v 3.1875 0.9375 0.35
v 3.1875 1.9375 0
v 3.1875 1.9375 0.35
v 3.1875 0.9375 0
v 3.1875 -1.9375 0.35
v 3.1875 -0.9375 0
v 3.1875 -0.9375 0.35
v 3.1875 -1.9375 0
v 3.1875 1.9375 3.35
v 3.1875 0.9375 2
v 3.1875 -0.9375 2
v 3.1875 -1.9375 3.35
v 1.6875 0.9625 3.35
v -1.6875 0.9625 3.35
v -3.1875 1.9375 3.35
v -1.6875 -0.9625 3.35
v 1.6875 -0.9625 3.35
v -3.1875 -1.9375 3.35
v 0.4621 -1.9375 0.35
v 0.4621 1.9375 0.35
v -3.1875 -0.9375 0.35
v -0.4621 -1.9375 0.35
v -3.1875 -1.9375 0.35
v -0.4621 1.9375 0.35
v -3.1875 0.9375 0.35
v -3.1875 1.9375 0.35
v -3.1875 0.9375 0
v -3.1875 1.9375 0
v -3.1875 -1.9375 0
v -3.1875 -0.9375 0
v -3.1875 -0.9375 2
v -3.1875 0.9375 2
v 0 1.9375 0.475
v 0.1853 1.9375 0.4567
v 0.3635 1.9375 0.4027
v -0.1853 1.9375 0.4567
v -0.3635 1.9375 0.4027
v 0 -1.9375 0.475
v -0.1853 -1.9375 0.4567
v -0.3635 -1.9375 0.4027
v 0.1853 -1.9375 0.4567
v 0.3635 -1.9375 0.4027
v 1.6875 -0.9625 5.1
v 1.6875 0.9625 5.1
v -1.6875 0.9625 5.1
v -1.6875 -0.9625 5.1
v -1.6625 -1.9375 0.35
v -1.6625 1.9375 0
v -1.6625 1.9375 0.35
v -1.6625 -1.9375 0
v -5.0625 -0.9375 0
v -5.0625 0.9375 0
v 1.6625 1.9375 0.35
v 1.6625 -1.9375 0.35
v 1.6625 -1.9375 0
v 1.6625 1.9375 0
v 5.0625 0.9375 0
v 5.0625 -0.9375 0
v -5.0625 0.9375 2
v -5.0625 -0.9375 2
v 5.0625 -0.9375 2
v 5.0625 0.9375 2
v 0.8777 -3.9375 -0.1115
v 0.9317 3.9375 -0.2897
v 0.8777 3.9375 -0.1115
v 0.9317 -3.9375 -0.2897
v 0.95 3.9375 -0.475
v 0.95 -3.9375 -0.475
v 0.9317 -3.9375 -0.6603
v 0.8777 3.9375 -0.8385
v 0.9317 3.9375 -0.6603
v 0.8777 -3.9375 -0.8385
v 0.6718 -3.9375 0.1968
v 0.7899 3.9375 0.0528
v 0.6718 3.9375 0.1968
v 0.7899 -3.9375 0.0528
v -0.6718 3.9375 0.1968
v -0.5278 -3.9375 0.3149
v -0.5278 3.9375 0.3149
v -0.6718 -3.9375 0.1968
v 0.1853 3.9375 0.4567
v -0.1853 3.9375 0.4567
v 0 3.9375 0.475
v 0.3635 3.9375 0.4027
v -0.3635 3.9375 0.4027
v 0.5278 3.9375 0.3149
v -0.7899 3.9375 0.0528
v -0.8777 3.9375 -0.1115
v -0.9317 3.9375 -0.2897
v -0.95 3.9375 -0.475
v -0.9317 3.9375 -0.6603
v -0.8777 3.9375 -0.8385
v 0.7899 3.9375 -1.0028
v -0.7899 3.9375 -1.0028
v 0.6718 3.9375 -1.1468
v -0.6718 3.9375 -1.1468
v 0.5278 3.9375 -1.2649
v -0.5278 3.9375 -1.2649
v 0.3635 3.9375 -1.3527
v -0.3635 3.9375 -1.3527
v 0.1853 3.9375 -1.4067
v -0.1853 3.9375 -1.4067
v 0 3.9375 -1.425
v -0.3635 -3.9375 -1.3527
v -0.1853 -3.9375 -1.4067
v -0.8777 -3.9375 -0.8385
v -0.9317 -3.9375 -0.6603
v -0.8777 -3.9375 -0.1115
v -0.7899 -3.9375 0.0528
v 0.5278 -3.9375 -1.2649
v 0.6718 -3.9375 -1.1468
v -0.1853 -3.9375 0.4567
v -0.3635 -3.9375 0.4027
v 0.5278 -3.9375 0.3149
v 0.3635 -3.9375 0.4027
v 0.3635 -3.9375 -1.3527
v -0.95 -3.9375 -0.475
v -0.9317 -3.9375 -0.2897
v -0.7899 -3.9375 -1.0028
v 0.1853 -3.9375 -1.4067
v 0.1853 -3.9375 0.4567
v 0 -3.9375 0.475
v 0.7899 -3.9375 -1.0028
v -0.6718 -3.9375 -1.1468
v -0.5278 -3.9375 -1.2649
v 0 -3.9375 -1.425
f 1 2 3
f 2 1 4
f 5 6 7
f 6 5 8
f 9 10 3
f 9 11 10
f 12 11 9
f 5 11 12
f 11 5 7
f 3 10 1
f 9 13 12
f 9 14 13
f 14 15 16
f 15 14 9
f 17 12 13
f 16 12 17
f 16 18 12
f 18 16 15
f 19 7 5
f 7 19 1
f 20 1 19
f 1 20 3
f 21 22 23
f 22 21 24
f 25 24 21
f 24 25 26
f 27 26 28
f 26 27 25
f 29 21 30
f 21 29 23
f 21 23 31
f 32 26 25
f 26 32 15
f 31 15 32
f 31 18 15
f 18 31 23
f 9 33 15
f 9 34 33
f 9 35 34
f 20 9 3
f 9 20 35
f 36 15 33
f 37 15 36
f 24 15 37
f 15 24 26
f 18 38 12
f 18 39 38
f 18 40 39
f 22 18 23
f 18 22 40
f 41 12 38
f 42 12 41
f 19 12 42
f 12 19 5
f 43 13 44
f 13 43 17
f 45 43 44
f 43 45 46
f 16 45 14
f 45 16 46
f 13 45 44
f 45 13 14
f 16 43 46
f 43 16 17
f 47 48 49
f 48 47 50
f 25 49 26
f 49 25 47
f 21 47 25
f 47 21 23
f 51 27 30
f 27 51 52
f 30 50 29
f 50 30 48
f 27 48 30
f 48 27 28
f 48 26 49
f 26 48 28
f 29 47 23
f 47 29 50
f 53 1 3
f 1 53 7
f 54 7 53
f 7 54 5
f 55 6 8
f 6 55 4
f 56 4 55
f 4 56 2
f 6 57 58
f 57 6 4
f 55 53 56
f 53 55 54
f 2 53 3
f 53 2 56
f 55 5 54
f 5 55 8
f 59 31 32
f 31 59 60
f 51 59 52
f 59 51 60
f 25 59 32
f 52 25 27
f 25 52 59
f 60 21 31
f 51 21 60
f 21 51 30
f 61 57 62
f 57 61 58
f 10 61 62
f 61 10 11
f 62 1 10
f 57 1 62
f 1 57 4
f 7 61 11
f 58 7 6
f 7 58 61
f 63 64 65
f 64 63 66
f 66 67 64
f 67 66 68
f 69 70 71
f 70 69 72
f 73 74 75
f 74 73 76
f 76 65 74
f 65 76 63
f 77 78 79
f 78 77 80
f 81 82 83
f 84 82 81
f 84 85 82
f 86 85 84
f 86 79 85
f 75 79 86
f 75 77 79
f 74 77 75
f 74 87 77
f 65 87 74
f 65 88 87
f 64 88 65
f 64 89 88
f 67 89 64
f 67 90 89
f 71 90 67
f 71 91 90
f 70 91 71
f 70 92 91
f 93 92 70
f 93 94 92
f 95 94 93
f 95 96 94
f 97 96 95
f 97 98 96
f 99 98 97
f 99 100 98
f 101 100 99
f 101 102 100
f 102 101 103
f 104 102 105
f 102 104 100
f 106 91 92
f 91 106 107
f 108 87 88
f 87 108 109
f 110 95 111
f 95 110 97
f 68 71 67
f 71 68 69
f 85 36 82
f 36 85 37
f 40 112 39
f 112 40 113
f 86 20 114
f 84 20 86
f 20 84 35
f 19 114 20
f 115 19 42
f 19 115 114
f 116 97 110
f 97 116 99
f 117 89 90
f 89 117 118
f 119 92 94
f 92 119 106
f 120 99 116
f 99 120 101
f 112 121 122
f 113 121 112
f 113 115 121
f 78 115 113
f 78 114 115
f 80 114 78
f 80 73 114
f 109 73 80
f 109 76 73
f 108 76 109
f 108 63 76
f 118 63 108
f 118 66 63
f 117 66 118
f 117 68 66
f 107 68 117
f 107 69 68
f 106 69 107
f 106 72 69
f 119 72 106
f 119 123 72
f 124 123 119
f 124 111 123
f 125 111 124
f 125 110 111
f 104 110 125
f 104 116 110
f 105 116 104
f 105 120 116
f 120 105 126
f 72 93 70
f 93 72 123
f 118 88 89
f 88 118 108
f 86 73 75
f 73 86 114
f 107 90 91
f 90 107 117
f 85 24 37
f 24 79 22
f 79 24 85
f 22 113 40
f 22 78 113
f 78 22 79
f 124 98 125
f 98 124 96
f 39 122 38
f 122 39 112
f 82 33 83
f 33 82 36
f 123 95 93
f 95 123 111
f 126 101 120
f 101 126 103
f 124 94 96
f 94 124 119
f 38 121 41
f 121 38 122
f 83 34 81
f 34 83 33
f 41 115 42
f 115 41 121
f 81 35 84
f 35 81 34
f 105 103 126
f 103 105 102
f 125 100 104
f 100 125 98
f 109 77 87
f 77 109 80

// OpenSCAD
nozzle_diameter = 0.25;

tactile_button();

//charge_indicator(true);

module charge_indicator(positive = false) {
    p = positive ? (nozzle_diameter * 1.5) : 0;
    
    translate([((5.25 + p) / -2) - 0.375, ((43.5 + p) / -2) - 0.075, -2.4])
    union() {
        // PCB.
        difference() {
            union() {
                cube([5.25 + p, 43.5 + p, 3]);
                translate([-5.5 - p / 2, 1 + p / 2, 0]) 
                    cube([16.5 + p, 41.5 + p, 3]);
            }
        
            // Mounting holes
            translate([(5.25 + p) / 2, 4.125 + (p / 2), 1.5]) {
                cylinder(d = 1.75, h = 4, $fn = 32, center = true);
                translate([0, 36, 0])
                    cylinder(d = 1.75, h = 4, $fn = 32, center = true);
            }
        }
        
        // Display
        translate([-5.5 - p / 2 - 1.5, 1 + 4.7 + p / 2, 3])
            translate([]) cube([20 + p, 31.25 + p, 6 + (positive ? 8 : 0)]);
        
        if (positive) {
            // Mounting holes
            translate([(5.25 + p) / 2, 4.125 + (p / 2), 0]) {
                cylinder(d = 1.75, h = 8, $fn = 32);
                translate([0, 36, 0])
                    cylinder(d = 1.75, h = 8, $fn = 32);
            }
        }
    }
}

module tactile_button(positive = true, depth = 0, retention_diameter = 1.65, retention_depth = 2) {
    p = positive ? (nozzle_diameter * 1.5) : 0;
    
    translate([(6 + p) / -2, (3.5 + p) / -2, -depth]) union() {
        translate([0, 0, 0.35]) {
            // body
            cube([6 + p, 3.5 + p, 3 + depth]);

            // button
            translate([3 / 2, 1.95 / 2, 0])
                cube([3 + p, 1.55 + p, 4.75 + depth]);
        }
        
        // standoffs
        translate([0, 0, depth]) {
            cube([1.15 + p, 3.5 + p, 0.35]);
            translate([6 + p - 1.15 - p, 0, 0])
                cube([1.15 + p, 3.5 + p, 0.35]);
        }
        
        // Egress of solder joints
        translate([-1.5 - p, 1, 0]) cube([1.5 + p, 1.5 + p, 2 + depth]);
        translate([6 + p, 1, 0]) cube([1.5 + p, 1.5 + p, 2 + depth]);
    }
    
    // retention holes
    translate([0, 0, (retention_diameter + nozzle_diameter) / -2 + 0.35 + nozzle_diameter / 2]) rotate([90, 0, 0]) cylinder(d = retention_diameter + nozzle_diameter, h = 3.5 + p + (retention_depth * 2), center = true, $fn = 32);
}
